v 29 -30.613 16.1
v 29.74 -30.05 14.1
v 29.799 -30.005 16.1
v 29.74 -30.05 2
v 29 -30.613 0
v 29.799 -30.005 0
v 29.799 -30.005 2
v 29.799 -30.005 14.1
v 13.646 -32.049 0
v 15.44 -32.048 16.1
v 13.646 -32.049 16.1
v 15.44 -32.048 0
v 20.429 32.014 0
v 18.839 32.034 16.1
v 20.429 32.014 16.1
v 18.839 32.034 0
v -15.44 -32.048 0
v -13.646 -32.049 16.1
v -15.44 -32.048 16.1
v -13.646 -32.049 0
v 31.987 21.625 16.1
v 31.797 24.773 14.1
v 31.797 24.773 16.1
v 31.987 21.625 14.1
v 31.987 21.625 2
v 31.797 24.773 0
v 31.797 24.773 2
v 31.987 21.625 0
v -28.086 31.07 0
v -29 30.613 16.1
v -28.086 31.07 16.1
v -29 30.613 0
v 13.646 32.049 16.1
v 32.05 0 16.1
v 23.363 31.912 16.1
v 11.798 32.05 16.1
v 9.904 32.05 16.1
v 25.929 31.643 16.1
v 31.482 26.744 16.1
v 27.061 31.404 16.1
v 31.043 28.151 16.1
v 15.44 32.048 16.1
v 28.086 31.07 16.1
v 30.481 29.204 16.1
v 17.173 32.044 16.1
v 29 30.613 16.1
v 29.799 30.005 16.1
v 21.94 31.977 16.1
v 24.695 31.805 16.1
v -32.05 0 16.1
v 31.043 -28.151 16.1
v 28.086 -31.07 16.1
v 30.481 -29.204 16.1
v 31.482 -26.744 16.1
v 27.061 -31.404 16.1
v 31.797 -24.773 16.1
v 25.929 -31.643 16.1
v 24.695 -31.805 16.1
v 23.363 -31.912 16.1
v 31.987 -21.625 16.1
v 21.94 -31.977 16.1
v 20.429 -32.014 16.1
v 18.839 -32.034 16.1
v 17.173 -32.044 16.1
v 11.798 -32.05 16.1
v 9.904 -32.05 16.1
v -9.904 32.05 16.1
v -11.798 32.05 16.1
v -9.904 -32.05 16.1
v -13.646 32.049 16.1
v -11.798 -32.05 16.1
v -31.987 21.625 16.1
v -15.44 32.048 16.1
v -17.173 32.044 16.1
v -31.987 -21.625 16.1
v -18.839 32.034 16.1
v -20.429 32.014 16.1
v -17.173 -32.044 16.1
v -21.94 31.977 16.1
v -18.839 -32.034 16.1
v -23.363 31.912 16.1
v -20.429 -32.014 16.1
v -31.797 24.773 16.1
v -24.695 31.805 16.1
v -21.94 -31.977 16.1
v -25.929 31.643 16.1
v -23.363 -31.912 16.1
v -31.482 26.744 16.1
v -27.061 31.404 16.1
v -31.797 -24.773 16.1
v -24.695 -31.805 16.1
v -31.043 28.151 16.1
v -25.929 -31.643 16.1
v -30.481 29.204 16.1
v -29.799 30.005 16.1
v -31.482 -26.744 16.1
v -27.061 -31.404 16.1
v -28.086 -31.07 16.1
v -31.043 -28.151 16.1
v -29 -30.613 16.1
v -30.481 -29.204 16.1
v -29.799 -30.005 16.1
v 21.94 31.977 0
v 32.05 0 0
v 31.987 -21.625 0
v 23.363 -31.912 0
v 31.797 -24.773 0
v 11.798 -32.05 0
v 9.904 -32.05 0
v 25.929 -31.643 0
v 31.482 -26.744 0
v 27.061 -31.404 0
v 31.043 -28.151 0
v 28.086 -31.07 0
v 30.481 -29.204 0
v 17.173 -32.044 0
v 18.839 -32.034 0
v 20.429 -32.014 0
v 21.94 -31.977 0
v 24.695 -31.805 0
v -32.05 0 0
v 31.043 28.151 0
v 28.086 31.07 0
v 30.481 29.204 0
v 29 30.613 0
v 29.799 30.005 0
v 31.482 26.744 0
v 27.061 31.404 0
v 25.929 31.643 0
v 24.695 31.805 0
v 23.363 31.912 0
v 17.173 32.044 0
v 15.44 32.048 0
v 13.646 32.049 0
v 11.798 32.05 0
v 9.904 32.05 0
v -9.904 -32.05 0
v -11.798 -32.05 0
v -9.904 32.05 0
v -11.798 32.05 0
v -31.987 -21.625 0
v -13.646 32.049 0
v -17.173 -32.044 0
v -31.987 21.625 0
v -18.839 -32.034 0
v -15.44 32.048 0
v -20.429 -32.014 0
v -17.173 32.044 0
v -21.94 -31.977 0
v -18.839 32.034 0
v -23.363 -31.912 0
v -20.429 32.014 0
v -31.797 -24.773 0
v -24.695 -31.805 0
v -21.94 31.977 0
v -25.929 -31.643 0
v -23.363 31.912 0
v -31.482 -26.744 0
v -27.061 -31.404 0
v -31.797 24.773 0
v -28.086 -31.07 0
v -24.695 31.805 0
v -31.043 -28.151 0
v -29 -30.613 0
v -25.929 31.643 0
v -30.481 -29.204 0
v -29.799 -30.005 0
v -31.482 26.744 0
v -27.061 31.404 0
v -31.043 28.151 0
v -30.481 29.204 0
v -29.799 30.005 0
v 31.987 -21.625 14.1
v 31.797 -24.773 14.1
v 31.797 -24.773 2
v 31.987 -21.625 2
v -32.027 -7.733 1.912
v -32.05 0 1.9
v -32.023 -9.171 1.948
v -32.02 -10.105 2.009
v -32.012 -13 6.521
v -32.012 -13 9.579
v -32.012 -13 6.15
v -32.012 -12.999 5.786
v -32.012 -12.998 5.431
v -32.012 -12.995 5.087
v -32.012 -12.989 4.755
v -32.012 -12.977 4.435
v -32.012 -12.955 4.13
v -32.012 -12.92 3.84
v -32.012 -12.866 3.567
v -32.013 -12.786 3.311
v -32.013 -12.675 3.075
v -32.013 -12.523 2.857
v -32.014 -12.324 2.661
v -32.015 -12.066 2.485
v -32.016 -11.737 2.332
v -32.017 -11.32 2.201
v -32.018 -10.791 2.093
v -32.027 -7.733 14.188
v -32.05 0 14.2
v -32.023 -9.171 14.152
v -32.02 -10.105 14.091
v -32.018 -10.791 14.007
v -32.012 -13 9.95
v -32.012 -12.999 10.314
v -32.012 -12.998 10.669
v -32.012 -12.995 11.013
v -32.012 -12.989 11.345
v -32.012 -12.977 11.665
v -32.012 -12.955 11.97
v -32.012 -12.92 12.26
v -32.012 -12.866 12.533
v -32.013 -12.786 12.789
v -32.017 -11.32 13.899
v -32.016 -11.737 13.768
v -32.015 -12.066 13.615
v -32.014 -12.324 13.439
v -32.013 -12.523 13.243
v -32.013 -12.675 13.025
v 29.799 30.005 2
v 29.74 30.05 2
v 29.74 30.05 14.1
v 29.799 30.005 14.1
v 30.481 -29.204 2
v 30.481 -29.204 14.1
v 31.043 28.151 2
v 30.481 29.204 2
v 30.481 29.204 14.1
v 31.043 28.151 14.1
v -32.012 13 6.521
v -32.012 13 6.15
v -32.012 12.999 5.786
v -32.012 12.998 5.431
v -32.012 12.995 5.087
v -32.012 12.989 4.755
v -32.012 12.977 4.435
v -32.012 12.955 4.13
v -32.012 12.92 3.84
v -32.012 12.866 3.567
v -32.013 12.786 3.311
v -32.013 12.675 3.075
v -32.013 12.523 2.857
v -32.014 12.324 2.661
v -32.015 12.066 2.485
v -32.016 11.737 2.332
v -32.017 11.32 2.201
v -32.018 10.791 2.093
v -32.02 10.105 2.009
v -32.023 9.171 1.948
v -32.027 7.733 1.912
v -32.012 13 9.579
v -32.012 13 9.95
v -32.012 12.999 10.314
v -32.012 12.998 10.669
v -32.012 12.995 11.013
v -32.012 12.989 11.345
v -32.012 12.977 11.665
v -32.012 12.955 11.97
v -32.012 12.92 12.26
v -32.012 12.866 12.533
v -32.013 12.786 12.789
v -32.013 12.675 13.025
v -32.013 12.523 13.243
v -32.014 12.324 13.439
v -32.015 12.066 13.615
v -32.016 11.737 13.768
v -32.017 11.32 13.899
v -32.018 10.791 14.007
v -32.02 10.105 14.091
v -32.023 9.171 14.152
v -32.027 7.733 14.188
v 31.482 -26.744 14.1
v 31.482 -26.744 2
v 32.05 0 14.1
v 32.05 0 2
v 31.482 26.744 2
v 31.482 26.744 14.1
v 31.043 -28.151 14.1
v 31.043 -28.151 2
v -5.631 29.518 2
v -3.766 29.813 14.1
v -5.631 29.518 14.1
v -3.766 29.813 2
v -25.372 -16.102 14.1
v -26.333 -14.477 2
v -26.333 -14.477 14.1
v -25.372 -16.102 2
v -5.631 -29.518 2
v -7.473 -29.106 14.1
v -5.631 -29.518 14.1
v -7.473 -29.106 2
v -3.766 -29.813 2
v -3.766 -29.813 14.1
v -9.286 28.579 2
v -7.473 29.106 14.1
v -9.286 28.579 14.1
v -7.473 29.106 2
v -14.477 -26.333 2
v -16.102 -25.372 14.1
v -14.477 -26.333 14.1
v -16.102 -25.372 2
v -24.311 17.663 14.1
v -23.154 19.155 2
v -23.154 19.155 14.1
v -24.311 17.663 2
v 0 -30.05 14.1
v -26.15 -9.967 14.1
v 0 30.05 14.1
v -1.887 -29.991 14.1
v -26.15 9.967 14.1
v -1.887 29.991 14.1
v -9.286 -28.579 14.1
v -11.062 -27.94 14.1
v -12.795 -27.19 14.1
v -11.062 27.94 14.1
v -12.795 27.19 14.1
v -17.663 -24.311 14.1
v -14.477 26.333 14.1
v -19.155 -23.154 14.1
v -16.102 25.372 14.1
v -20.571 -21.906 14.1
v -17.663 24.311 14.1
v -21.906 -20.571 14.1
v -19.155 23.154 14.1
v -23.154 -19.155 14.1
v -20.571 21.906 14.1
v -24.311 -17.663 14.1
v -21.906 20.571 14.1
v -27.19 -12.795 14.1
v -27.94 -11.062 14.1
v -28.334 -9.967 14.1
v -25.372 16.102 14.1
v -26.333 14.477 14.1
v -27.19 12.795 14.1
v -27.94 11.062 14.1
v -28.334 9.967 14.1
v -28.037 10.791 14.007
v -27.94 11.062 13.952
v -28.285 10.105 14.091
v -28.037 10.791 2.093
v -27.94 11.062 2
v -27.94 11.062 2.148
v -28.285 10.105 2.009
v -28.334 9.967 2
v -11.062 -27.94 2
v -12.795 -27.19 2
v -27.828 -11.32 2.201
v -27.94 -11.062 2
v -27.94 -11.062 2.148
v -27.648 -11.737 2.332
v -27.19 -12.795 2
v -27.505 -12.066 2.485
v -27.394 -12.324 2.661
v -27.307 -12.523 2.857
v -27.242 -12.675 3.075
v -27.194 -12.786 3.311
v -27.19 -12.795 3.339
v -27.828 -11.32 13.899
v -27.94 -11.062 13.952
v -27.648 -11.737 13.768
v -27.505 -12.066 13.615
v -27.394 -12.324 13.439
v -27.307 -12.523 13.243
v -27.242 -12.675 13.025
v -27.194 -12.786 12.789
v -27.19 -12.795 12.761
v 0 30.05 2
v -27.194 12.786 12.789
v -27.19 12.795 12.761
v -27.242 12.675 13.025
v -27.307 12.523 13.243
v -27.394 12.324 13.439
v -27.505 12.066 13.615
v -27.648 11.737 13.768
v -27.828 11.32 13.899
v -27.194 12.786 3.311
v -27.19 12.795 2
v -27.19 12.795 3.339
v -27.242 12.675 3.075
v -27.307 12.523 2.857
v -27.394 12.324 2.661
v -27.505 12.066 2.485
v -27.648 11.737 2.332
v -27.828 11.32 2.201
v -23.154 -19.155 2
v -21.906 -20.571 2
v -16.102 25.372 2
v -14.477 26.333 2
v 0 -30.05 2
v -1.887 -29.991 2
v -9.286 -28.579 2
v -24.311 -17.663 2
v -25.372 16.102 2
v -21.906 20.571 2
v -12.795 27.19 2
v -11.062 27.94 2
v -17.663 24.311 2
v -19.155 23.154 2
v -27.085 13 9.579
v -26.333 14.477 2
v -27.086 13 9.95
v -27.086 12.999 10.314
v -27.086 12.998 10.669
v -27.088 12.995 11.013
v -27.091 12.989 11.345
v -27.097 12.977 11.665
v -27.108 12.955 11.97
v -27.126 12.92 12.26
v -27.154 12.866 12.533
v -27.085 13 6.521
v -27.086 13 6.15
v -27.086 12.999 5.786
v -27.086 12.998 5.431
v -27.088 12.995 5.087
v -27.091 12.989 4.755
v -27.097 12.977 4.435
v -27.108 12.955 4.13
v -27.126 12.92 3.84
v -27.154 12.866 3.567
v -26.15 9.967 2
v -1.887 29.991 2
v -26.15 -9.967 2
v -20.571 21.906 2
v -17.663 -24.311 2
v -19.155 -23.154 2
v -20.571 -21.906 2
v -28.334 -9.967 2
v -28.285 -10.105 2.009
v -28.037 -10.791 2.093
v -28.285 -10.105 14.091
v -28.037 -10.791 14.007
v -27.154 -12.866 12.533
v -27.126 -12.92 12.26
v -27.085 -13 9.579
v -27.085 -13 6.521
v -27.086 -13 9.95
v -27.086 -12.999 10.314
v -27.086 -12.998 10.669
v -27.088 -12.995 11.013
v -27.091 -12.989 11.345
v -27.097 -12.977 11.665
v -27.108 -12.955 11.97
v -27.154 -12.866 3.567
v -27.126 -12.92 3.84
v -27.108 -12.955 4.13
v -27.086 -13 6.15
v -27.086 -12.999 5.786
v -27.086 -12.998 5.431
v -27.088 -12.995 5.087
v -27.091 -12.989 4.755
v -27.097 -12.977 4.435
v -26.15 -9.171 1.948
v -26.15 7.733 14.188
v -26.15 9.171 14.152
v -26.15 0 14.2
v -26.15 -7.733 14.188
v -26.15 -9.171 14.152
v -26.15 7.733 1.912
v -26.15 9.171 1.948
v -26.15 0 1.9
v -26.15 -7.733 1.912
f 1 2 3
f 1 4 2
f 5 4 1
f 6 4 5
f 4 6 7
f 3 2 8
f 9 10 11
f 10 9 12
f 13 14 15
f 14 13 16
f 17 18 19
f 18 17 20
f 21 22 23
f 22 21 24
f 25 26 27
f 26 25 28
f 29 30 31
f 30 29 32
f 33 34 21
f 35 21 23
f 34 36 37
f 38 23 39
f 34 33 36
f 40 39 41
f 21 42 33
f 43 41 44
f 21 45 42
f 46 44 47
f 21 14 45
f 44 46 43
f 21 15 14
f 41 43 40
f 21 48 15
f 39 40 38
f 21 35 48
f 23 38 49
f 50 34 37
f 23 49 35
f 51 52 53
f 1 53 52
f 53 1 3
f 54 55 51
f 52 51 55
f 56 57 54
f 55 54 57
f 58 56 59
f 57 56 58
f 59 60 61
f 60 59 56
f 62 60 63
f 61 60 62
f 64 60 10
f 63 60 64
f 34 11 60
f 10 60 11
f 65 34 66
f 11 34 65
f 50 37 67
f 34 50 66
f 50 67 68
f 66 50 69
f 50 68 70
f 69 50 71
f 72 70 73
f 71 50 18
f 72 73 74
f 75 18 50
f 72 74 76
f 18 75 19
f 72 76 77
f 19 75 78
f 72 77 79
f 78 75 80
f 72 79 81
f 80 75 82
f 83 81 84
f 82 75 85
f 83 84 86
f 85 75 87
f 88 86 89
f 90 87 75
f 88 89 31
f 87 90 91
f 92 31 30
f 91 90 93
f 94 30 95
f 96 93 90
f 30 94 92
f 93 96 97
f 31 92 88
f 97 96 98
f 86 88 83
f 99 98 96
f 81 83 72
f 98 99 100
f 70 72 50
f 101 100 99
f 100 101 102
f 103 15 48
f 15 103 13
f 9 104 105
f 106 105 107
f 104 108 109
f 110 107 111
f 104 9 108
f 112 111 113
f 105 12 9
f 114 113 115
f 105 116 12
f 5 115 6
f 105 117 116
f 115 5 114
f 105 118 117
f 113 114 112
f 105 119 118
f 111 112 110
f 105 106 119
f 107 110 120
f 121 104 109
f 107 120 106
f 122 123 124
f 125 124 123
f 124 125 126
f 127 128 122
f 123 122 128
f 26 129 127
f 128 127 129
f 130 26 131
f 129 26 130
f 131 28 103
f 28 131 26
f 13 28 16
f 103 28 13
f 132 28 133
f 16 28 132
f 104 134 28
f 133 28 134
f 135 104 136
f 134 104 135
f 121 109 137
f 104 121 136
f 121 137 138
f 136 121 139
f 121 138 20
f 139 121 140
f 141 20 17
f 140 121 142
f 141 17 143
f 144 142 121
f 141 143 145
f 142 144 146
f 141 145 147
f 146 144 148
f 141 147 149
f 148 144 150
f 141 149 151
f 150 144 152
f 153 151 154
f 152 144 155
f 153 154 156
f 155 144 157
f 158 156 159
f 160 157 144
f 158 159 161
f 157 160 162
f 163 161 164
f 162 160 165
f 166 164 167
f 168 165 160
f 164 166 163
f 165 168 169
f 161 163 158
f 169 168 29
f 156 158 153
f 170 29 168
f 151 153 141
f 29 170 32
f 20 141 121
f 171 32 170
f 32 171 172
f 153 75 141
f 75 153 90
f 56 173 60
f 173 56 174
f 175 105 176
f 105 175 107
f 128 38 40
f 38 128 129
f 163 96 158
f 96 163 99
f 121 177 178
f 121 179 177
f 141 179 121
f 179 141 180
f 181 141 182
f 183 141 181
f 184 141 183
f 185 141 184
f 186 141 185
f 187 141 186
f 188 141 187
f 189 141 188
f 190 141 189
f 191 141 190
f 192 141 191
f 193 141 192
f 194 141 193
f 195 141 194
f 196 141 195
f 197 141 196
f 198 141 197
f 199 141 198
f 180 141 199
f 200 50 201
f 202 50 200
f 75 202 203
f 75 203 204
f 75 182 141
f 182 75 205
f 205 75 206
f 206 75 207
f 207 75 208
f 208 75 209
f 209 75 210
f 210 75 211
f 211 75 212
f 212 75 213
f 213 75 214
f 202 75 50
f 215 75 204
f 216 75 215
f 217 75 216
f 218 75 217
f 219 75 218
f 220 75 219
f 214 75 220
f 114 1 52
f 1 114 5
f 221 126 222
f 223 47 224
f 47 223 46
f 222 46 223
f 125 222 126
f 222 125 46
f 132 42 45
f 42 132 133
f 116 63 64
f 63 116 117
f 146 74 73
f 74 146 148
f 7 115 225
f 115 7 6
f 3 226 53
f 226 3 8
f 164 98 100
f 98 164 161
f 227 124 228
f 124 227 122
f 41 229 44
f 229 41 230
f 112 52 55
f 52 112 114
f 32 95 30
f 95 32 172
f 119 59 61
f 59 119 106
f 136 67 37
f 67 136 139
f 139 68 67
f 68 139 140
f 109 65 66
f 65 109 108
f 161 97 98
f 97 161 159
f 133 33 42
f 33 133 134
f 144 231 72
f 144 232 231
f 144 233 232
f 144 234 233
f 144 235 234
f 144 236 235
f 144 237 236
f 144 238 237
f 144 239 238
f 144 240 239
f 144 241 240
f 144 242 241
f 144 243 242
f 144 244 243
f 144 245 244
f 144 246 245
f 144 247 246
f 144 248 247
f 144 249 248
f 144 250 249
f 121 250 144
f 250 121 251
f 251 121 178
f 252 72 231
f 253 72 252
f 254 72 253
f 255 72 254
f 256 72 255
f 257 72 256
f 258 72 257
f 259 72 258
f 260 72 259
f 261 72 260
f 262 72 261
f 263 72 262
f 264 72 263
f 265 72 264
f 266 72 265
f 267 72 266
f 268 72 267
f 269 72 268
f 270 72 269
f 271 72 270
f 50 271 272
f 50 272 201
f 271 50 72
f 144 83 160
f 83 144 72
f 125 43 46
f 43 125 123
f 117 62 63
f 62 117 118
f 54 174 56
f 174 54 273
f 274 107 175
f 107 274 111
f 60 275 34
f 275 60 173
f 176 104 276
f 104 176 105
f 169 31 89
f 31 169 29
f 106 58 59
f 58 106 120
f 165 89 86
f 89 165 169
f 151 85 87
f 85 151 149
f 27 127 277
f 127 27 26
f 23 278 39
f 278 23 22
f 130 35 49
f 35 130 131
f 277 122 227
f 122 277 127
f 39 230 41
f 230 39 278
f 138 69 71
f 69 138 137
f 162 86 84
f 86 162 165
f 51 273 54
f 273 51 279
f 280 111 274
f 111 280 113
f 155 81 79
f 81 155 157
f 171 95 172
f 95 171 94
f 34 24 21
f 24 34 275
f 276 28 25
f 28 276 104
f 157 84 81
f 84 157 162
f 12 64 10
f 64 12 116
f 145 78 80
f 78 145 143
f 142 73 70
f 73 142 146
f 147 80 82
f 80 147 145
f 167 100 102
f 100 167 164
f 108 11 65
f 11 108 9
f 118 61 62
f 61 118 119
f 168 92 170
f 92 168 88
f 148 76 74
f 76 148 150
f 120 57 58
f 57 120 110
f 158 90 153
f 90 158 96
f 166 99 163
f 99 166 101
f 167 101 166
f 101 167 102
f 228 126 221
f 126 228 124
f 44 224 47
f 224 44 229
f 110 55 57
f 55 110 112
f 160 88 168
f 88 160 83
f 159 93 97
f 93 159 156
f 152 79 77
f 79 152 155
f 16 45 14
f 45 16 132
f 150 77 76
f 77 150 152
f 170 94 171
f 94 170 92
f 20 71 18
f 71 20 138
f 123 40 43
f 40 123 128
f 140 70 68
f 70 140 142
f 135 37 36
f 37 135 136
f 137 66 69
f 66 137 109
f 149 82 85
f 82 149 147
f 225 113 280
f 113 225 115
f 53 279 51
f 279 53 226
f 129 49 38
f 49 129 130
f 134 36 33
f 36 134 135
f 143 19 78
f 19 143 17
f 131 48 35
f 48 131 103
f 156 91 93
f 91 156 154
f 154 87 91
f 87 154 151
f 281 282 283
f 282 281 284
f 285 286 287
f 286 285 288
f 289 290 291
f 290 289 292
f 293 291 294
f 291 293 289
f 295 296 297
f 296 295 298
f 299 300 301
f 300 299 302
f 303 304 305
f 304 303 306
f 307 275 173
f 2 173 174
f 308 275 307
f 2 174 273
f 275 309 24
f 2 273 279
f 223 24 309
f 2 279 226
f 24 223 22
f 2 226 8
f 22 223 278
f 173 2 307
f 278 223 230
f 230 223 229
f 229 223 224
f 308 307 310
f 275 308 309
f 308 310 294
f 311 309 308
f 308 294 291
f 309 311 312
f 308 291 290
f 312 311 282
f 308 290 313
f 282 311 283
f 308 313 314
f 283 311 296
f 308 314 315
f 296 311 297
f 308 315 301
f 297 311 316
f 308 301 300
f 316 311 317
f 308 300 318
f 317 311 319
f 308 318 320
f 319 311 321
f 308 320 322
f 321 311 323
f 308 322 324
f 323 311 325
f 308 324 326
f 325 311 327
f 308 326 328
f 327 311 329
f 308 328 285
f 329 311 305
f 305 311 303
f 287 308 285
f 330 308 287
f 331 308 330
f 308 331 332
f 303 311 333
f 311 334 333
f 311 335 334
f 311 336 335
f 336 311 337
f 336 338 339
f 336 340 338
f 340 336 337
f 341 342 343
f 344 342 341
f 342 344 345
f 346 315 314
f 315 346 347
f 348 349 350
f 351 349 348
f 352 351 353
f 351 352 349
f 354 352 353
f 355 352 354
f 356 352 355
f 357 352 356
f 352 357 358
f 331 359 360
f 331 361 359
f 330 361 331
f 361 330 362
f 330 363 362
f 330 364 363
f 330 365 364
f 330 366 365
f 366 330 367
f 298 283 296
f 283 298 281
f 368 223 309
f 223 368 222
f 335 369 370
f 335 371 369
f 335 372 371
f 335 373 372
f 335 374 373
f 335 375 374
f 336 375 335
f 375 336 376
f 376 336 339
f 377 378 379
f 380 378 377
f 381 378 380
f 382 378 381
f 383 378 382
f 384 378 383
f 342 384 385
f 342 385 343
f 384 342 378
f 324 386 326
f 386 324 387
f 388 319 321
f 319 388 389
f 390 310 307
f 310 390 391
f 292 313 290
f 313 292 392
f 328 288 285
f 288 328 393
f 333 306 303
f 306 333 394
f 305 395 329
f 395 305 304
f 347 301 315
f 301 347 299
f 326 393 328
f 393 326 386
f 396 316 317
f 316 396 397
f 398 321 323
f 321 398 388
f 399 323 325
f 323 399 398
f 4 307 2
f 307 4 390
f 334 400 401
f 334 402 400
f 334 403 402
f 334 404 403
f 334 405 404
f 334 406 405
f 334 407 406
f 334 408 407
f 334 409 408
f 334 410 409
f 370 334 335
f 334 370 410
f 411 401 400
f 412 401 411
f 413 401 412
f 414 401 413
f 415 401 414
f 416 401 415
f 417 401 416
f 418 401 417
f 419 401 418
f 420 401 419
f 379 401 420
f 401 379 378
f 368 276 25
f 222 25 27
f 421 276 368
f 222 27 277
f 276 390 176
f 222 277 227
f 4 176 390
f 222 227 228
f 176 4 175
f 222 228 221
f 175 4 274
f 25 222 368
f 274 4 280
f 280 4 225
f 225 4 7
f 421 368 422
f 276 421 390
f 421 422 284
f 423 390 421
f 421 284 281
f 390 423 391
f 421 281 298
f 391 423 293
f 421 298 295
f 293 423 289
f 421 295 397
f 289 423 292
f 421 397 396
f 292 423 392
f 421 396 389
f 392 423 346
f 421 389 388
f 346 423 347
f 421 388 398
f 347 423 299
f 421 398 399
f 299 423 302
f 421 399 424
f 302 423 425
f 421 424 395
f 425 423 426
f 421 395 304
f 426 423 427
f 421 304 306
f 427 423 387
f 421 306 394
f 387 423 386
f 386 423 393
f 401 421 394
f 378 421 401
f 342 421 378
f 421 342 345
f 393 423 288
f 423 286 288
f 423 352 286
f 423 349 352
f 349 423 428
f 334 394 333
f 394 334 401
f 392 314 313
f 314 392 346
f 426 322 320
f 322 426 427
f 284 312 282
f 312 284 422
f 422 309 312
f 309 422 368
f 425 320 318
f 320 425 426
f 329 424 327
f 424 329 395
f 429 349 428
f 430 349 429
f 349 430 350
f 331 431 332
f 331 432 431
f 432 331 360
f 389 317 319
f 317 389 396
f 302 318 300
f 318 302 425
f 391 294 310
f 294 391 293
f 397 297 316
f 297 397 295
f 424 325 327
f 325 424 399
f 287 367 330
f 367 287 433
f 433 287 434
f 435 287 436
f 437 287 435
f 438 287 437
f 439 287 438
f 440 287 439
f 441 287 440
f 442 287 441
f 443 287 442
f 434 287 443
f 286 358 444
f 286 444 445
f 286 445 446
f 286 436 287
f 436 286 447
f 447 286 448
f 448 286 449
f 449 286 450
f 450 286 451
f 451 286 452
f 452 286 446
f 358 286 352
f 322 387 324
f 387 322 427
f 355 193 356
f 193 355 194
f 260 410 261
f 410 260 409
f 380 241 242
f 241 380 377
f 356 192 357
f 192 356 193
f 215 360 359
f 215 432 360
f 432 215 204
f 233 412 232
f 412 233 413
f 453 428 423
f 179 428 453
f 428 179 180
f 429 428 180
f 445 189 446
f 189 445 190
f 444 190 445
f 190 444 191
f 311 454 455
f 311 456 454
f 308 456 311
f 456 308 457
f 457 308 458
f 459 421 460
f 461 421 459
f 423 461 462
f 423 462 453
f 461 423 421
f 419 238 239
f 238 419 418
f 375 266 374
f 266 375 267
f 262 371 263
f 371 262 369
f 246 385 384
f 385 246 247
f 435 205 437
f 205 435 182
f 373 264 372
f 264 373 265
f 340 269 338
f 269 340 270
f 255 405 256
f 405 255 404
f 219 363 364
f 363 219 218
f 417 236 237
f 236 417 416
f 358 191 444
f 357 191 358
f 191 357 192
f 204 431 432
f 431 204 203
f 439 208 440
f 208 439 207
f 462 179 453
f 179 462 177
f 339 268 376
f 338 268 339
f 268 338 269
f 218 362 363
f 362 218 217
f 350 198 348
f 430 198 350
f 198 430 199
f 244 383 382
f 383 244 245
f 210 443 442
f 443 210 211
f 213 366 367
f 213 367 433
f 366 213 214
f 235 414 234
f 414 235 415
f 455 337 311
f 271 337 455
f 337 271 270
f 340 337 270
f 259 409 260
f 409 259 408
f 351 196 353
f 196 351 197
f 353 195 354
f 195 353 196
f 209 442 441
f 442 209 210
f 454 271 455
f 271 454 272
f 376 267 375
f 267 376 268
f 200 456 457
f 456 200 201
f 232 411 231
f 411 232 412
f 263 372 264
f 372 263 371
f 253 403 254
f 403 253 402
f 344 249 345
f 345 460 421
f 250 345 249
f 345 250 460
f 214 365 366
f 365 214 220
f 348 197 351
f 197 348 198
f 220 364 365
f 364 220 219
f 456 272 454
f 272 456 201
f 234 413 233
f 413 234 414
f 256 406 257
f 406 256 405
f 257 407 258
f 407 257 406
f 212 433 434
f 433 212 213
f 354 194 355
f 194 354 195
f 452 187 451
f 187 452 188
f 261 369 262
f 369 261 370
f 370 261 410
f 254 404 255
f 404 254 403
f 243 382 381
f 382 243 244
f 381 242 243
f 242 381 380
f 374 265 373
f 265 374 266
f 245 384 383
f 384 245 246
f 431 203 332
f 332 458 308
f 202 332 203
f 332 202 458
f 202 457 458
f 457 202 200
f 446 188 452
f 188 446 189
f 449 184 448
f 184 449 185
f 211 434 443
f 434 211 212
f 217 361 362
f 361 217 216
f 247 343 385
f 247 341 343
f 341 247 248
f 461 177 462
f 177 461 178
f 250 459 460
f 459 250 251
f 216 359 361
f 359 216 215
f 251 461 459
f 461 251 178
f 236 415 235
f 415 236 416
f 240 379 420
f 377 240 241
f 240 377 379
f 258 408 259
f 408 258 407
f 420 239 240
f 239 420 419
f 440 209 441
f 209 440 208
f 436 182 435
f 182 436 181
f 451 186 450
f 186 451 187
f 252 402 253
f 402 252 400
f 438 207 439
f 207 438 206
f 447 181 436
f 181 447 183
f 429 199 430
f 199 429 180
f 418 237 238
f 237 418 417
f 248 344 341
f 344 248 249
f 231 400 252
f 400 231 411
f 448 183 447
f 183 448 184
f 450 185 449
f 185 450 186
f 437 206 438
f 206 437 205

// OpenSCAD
// file: ../../functions/reverse.scad
function reverse(lst) =
  let(max = len(lst) - 1) [for(idx = [0 : max]) lst[max - idx]];
// file: ../../modules/superellipse.scad
use <../functions/reverse.scad>

module superellipse(ra = 1, rb = 1, n = 3) {
  inv_n = 1 / n;
  step = 90 / $fn * 4;

  pos_quadrant_pts = [
    for(angle = [0 : step : 90])
      let(x = sin(angle) * ra, y = rb * (1 - (x / ra) ^ n) ^ inv_n) [x, y]
  ];

  rev_pos_quadrant_pts = reverse(pos_quadrant_pts);

  polygon(points = [
    each rev_pos_quadrant_pts,
    for(p = pos_quadrant_pts) [-p.x, p.y],
    for(p = rev_pos_quadrant_pts) [-p.x, -p.y],
    for(p = pos_quadrant_pts) [p.x, -p.y]
  ]);
}
// file: ../../modules/squircle.scad
use <./superellipse.scad>

module squircle(r = 1, n = 3)
  superellipse(ra = r, rb = r, n = n);
// main file
use <../../modules/squircle.scad>
use <../../modules/superellipse.scad>

$fn = 100;

tolerance = 0.1;
diameter = 60 + tolerance;
filter_height = 12 + tolerance;

case_height = filter_height + 4;
case_diameter = diameter + 4;

module filter_shape() cylinder(d = diameter, h = filter_height);

difference() {
  linear_extrude(height = case_height) squircle(r = case_diameter / 2, n = 10);

  translate([0, 0, (case_height - filter_height) / 2]) hull() {
    filter_shape();
    translate([case_diameter, 0]) filter_shape();
  }

  translate([-case_diameter / 2 - 0.1, 0, case_height / 2])
    rotate([0, 90]) linear_extrude(height = 6)
    superellipse(ra = filter_height / 2 + 0.1, rb = 13, n = 8);
}
